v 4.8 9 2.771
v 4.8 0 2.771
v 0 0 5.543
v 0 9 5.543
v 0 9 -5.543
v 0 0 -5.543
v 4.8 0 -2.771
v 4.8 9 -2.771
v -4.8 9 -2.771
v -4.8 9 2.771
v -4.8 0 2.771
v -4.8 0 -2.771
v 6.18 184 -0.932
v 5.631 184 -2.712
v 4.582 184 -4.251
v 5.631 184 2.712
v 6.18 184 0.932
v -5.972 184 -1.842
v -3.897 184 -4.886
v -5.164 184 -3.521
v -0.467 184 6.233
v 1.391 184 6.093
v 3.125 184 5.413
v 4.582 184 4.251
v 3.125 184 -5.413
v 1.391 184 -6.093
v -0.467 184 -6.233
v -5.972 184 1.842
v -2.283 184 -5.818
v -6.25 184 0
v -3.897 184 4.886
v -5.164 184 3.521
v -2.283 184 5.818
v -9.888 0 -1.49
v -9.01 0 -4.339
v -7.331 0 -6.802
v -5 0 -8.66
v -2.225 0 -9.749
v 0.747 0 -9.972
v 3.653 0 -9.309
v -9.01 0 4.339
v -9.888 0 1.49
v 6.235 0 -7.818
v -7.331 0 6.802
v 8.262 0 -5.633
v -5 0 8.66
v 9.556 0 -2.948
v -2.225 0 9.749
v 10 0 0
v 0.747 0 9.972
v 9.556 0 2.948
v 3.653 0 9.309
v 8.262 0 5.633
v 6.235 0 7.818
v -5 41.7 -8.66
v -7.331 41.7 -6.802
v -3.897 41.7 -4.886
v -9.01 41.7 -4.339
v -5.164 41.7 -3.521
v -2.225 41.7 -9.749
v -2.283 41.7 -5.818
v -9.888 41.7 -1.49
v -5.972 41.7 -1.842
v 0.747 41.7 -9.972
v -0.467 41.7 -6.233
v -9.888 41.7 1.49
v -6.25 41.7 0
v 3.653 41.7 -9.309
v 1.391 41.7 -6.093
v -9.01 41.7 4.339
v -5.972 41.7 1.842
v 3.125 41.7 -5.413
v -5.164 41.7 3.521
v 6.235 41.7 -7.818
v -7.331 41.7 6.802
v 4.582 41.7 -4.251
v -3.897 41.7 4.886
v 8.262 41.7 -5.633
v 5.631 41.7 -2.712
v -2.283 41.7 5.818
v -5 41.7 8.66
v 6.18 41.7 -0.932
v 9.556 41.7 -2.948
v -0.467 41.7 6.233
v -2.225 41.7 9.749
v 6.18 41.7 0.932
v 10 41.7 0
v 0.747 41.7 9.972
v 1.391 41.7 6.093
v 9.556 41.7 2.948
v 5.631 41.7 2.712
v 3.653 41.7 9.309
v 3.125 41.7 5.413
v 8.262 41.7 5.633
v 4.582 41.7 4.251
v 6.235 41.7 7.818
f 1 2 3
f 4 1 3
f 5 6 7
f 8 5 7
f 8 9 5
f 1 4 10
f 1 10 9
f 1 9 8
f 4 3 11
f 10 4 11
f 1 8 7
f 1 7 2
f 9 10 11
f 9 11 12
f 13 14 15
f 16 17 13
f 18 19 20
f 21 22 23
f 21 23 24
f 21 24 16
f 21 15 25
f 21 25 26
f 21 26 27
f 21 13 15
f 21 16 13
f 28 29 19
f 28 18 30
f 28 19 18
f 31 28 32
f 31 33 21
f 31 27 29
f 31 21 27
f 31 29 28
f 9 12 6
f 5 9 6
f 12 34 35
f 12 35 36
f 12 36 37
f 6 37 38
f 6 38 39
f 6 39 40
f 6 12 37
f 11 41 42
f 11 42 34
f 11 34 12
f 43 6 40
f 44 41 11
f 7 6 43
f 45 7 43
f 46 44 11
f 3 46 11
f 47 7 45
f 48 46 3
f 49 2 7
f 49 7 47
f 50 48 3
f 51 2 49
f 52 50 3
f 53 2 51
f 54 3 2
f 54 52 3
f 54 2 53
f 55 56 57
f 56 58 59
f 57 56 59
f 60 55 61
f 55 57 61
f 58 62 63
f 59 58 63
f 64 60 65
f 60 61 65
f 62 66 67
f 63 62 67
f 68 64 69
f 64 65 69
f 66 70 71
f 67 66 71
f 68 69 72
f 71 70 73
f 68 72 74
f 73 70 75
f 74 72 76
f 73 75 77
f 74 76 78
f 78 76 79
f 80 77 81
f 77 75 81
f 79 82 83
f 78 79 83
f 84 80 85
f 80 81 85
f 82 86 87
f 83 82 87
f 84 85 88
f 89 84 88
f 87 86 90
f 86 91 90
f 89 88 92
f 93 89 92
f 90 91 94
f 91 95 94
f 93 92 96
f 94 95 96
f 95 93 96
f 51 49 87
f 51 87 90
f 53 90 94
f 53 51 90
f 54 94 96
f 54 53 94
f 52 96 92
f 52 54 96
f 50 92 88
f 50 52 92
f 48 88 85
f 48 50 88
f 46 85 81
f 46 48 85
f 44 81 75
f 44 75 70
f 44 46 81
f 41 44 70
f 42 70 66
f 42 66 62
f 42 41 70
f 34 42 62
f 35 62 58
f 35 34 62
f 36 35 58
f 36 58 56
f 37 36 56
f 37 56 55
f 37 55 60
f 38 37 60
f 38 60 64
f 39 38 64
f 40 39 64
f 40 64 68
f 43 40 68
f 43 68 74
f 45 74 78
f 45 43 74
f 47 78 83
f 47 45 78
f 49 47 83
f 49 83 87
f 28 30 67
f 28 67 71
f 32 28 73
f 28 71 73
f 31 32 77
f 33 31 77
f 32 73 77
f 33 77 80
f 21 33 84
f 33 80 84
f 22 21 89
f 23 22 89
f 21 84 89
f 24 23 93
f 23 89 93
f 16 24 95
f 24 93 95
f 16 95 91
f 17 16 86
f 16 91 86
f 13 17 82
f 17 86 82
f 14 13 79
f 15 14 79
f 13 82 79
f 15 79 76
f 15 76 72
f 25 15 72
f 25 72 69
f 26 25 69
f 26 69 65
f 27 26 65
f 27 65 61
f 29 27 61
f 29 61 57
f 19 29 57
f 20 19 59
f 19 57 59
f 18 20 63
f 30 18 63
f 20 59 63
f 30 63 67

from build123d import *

# Parameters (mm, degrees)
F0_R     = 10
F1_DEPTH = 41.7
F2_R     = 6.25
F3_DEPTH = 142.3
F5_DEPTH = 9


with BuildPart() as f1:
    # F0 (on Front) → F1 (new body)
    with BuildSketch(Plane.XZ):
        Circle(F0_R)
    extrude(amount=-F1_DEPTH)

    # F2 (on face) → F3 (join)
    with BuildSketch(Plane(origin=(0, 41.7, 0), x_dir=(-1, 0, 0), z_dir=(0, 1, 0))):
        Circle(F2_R)
    extrude(amount=F3_DEPTH)

    # F4 (on face) → F5 (cut)
    with BuildSketch(Plane.XZ):
        Polygon((4.8, -2.771281), (4.8, 2.771281), (0, 5.542563), (-4.8, 2.771281), (-4.8, -2.771281), (0, -5.542563), align=None)
    extrude(amount=-F5_DEPTH, mode=Mode.SUBTRACT)


solid = f1.part
